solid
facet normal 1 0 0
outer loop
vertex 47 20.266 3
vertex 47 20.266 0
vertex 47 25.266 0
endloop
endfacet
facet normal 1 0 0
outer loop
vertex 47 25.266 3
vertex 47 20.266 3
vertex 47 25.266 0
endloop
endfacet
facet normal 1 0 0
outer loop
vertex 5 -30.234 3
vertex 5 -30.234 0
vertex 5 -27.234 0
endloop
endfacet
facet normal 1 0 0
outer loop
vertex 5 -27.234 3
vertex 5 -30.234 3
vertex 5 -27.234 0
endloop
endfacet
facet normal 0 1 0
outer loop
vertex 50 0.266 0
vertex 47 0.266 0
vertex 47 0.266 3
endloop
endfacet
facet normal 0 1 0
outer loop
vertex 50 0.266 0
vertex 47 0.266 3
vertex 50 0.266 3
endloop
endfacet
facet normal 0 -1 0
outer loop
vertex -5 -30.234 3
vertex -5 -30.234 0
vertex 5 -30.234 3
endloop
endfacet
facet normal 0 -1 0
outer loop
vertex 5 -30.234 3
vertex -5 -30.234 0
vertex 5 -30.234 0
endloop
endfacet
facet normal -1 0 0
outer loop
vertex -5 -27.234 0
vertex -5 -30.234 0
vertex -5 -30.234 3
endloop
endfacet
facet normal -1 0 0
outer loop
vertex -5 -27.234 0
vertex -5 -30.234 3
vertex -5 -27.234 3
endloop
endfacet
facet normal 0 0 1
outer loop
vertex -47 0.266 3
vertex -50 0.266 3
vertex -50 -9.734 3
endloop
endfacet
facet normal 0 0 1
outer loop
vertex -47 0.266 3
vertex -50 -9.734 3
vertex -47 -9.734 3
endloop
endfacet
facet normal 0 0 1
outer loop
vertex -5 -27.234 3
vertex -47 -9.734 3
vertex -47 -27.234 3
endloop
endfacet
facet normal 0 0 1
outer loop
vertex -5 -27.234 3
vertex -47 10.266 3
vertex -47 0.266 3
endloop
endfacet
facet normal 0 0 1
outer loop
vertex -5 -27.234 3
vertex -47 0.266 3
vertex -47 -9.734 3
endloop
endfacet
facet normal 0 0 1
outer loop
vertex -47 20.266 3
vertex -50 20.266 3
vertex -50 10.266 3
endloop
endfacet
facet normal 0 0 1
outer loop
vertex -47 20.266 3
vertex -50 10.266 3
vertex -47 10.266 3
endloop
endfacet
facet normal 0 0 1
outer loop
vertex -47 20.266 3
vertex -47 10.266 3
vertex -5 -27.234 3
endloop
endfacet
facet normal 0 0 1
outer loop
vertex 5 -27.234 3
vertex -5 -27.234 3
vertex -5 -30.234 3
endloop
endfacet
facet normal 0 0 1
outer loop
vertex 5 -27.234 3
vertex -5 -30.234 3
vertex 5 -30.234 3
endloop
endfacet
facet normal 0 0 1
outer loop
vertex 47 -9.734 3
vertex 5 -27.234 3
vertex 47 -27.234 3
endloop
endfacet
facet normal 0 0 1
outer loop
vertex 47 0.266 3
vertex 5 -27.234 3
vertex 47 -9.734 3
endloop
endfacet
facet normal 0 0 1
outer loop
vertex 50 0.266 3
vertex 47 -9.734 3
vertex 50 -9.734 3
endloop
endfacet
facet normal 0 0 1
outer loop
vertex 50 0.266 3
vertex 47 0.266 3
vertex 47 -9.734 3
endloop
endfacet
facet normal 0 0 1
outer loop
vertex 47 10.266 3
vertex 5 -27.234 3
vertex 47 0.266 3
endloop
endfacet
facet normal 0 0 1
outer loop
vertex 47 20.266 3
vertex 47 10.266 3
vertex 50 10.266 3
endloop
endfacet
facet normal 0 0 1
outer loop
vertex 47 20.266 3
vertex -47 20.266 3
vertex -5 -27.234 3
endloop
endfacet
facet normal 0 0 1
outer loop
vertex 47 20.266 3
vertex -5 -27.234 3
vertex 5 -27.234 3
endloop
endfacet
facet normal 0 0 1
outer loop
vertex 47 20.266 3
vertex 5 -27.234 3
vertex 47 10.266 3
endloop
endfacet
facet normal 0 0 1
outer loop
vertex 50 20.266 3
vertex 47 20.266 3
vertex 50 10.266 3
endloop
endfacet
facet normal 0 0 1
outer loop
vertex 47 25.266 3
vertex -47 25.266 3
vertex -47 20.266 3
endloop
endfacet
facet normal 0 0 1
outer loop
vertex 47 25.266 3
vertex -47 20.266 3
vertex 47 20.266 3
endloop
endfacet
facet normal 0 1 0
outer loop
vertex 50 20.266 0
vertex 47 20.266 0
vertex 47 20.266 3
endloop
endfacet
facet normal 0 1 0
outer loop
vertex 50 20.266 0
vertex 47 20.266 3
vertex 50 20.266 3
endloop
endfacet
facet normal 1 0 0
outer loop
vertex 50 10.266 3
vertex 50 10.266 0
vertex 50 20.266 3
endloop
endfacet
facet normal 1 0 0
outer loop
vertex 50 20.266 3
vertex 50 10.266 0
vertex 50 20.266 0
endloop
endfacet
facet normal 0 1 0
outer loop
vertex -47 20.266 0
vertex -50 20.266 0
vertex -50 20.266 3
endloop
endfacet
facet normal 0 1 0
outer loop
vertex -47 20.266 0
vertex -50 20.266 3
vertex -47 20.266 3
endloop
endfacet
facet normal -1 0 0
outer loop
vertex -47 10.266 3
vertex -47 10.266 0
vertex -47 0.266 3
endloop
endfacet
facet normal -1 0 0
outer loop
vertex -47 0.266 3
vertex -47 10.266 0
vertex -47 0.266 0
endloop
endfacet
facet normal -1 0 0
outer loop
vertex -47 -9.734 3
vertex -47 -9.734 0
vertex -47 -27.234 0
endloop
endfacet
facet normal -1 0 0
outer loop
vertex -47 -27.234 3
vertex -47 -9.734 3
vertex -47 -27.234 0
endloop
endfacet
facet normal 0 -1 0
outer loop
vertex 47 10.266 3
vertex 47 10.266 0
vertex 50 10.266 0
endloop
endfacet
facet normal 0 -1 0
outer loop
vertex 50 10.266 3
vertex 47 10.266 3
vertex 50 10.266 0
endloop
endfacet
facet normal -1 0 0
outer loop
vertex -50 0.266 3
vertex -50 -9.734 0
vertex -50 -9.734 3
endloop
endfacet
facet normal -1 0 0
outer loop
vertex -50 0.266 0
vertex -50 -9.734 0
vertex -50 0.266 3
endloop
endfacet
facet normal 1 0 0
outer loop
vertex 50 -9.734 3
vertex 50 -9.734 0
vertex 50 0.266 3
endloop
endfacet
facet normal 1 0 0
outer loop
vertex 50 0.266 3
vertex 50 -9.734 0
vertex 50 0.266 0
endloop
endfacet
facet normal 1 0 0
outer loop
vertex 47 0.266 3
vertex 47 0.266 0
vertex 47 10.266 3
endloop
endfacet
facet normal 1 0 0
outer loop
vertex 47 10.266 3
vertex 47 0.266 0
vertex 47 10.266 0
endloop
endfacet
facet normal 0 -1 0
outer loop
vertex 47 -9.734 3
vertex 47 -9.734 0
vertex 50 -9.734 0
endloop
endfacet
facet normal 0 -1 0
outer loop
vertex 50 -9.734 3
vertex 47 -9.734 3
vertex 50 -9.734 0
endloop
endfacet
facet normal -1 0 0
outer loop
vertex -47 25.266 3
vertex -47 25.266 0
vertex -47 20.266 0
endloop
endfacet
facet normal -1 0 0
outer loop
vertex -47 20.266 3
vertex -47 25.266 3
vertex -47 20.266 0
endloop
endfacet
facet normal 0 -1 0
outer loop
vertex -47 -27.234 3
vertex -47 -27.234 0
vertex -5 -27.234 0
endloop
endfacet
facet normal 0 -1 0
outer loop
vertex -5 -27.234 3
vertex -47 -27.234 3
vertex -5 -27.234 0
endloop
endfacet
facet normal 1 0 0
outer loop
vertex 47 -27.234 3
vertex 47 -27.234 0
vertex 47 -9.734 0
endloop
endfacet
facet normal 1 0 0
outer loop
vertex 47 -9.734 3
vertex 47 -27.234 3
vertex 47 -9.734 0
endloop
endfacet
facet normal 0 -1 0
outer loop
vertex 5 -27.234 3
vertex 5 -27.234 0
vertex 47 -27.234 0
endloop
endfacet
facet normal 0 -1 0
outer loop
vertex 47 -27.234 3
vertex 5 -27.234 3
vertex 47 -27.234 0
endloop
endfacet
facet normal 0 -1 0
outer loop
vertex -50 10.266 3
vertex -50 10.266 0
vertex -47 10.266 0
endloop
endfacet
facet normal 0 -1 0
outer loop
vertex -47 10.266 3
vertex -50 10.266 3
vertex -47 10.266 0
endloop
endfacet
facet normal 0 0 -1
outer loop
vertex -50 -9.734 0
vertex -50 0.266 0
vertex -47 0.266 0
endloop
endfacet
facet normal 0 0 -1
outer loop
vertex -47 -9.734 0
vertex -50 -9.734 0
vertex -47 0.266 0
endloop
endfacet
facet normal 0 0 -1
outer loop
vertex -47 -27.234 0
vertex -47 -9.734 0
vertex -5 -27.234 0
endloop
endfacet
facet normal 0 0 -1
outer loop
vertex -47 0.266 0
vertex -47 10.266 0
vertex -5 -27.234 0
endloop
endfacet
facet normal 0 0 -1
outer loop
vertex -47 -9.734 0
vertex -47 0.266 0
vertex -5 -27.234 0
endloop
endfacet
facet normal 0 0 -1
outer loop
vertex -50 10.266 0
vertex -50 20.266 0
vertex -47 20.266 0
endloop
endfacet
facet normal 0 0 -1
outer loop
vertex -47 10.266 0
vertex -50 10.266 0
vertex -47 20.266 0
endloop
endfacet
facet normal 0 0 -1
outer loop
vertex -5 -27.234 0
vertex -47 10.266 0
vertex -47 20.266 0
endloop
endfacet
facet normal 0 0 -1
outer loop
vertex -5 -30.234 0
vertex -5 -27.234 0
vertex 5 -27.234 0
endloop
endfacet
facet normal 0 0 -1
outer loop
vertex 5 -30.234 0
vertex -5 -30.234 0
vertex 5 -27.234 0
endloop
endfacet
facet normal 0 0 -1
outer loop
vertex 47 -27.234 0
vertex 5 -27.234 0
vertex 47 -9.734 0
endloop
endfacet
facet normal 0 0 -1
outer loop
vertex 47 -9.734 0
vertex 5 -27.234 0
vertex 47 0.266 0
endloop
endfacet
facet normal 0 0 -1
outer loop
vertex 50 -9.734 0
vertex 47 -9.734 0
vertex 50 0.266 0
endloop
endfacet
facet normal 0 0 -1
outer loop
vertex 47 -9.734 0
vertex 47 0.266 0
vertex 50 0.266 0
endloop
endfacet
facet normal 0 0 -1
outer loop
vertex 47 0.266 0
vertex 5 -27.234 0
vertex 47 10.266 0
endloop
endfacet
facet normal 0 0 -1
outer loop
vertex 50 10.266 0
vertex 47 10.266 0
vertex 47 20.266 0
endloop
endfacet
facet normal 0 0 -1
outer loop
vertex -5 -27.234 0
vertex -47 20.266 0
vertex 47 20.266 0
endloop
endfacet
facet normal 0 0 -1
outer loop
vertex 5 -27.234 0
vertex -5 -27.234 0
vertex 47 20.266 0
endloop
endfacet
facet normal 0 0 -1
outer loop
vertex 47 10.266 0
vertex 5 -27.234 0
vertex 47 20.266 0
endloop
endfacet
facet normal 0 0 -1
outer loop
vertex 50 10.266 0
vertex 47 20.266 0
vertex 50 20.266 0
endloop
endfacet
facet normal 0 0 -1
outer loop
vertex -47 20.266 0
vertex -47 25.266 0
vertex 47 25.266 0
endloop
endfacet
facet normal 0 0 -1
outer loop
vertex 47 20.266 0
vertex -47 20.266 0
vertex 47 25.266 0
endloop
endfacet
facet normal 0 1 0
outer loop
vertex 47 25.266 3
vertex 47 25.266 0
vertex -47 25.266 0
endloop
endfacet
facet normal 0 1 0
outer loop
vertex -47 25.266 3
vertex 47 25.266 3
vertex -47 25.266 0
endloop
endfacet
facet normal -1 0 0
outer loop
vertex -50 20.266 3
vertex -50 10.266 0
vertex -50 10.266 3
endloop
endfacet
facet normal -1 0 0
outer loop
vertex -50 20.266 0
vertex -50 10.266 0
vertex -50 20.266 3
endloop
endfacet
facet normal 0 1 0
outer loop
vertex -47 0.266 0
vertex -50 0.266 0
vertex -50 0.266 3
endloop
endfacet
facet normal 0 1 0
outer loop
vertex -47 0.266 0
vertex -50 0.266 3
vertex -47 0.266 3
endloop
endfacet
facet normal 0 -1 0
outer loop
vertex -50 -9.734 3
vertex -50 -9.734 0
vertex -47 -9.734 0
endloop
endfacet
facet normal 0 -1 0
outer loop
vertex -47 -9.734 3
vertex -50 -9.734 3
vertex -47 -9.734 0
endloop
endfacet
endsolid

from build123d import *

# Parameters (mm, degrees)
SKETCH_1_W      = 3
SKETCH_1_H      = 10
SKETCH_1_W_2    = 5
SKETCH_1_H_2    = 3
EXTRUDE_1_DEPTH = 3


with BuildPart() as part:
    # 草圖1 → 填料-伸長1 (new body)
    with BuildSketch(Plane.XY):
        with Locations((-48.5, -4.734163056)):
            Rectangle(SKETCH_1_W, SKETCH_1_H)
        Polygon((-5, -27.234163056), (0, -27.234163056), (5, -27.234163056), (47, -27.234163056), (47, -9.734163056), (47, 0.265836944), (47, 10.265836944), (47, 20.265836944), (47, 25.265836944), (-47, 25.265836944), (-47, 20.265836944), (-47, 10.265836944), (-47, 0.265836944), (-47, -9.734163056), (-47, -27.234163056), align=None)
        with Locations((-2.5, -28.734163056)):
            Rectangle(SKETCH_1_W_2, SKETCH_1_H_2)
        with Locations((2.5, -28.734163056)):
            Rectangle(SKETCH_1_W_2, SKETCH_1_H_2)
        with Locations((-48.5, 15.265836944)):
            Rectangle(SKETCH_1_W, SKETCH_1_H)
        with Locations((48.5, 15.265836944)):
            Rectangle(SKETCH_1_W, SKETCH_1_H)
        with Locations((48.5, -4.734163056)):
            Rectangle(SKETCH_1_W, SKETCH_1_H)
    extrude(amount=EXTRUDE_1_DEPTH)


solid = part.part
